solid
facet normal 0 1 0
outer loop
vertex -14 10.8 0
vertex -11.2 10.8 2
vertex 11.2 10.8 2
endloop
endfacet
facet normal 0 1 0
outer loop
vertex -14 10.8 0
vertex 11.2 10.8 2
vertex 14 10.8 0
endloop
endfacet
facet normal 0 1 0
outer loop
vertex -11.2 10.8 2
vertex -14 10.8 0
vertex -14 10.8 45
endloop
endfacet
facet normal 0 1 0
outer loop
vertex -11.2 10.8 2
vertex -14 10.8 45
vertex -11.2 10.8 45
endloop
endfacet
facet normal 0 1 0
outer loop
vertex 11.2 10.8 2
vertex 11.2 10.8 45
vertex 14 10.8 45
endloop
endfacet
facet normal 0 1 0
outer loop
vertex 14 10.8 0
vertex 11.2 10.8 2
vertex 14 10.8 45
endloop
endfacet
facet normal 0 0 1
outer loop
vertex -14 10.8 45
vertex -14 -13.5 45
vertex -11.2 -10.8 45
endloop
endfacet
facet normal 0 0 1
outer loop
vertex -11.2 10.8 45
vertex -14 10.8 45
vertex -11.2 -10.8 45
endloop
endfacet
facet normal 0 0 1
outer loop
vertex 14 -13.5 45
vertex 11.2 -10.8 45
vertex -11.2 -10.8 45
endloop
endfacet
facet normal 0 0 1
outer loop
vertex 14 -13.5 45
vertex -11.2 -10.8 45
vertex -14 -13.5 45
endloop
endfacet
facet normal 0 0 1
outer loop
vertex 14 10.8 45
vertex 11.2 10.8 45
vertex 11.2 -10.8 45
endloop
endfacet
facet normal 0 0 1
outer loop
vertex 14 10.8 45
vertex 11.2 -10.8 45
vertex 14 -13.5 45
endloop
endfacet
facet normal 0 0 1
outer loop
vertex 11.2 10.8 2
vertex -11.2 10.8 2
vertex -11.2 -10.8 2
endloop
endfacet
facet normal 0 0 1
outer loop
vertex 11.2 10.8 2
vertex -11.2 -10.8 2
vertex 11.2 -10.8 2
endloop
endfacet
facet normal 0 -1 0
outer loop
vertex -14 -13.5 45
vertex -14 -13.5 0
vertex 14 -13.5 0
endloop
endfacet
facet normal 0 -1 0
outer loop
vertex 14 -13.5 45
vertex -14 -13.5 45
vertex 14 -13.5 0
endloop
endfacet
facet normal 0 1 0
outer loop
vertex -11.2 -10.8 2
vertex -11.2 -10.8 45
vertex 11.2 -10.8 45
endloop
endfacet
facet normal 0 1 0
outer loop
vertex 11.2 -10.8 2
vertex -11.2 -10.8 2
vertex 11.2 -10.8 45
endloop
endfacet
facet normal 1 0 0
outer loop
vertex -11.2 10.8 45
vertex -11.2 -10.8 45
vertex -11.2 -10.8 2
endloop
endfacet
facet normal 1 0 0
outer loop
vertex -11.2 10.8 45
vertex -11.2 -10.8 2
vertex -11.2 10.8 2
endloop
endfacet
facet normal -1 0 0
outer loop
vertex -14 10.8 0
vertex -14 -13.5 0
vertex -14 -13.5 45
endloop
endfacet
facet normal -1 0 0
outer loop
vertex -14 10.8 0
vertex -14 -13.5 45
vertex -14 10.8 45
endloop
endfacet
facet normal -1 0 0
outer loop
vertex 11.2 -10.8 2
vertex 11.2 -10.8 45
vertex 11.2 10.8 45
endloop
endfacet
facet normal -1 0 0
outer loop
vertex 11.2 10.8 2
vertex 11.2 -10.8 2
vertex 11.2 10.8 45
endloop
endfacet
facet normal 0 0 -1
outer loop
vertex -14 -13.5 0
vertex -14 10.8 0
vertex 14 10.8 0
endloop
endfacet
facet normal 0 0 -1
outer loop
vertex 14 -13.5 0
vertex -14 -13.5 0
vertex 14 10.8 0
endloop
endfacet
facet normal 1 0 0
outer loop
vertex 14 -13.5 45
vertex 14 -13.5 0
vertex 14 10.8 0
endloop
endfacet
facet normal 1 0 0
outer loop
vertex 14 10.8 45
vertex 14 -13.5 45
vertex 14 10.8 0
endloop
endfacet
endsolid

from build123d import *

# Parameters (mm, degrees)
SKETCH1_W           = 28
SKETCH1_H           = 27
BOSS_EXTRUDE1_DEPTH = 45
SKETCH2_W           = 22.4
SKETCH2_H           = 21.6
CUT_EXTRUDE1_DEPTH  = 43
FILLET3_R           = 2
SKETCH12_W          = 28
SKETCH12_H          = 3.238807787
CUT_EXTRUDE9_DEPTH  = 50.022953807


with BuildPart() as part:
    # Sketch1 → Boss-Extrude1 (new body)
    with BuildSketch(Plane.XY):
        Rectangle(SKETCH1_W, SKETCH1_H)
    extrude(amount=BOSS_EXTRUDE1_DEPTH)

    # Sketch2 → Cut-Extrude1 (cut)
    with BuildSketch(Plane.XY.offset(45)):
        Rectangle(SKETCH2_W, SKETCH2_H)
    extrude(amount=-CUT_EXTRUDE1_DEPTH, mode=Mode.SUBTRACT)

    # Fillet3
    fillet3_edges = [part.edges().sort_by_distance(p)[0] for p in [
        (-14, 13.5, 22.5),
        (14, 13.5, 22.5),
    ]]
    fillet(fillet3_edges, radius=FILLET3_R)

    # Sketch12 → Cut-Extrude9 (cut, through all)
    with BuildSketch(Plane.XY.offset(45)):
        with Locations((0, 12.419403894)):
            Rectangle(SKETCH12_W, SKETCH12_H)
    extrude(amount=-CUT_EXTRUDE9_DEPTH, mode=Mode.SUBTRACT)


solid = part.part
